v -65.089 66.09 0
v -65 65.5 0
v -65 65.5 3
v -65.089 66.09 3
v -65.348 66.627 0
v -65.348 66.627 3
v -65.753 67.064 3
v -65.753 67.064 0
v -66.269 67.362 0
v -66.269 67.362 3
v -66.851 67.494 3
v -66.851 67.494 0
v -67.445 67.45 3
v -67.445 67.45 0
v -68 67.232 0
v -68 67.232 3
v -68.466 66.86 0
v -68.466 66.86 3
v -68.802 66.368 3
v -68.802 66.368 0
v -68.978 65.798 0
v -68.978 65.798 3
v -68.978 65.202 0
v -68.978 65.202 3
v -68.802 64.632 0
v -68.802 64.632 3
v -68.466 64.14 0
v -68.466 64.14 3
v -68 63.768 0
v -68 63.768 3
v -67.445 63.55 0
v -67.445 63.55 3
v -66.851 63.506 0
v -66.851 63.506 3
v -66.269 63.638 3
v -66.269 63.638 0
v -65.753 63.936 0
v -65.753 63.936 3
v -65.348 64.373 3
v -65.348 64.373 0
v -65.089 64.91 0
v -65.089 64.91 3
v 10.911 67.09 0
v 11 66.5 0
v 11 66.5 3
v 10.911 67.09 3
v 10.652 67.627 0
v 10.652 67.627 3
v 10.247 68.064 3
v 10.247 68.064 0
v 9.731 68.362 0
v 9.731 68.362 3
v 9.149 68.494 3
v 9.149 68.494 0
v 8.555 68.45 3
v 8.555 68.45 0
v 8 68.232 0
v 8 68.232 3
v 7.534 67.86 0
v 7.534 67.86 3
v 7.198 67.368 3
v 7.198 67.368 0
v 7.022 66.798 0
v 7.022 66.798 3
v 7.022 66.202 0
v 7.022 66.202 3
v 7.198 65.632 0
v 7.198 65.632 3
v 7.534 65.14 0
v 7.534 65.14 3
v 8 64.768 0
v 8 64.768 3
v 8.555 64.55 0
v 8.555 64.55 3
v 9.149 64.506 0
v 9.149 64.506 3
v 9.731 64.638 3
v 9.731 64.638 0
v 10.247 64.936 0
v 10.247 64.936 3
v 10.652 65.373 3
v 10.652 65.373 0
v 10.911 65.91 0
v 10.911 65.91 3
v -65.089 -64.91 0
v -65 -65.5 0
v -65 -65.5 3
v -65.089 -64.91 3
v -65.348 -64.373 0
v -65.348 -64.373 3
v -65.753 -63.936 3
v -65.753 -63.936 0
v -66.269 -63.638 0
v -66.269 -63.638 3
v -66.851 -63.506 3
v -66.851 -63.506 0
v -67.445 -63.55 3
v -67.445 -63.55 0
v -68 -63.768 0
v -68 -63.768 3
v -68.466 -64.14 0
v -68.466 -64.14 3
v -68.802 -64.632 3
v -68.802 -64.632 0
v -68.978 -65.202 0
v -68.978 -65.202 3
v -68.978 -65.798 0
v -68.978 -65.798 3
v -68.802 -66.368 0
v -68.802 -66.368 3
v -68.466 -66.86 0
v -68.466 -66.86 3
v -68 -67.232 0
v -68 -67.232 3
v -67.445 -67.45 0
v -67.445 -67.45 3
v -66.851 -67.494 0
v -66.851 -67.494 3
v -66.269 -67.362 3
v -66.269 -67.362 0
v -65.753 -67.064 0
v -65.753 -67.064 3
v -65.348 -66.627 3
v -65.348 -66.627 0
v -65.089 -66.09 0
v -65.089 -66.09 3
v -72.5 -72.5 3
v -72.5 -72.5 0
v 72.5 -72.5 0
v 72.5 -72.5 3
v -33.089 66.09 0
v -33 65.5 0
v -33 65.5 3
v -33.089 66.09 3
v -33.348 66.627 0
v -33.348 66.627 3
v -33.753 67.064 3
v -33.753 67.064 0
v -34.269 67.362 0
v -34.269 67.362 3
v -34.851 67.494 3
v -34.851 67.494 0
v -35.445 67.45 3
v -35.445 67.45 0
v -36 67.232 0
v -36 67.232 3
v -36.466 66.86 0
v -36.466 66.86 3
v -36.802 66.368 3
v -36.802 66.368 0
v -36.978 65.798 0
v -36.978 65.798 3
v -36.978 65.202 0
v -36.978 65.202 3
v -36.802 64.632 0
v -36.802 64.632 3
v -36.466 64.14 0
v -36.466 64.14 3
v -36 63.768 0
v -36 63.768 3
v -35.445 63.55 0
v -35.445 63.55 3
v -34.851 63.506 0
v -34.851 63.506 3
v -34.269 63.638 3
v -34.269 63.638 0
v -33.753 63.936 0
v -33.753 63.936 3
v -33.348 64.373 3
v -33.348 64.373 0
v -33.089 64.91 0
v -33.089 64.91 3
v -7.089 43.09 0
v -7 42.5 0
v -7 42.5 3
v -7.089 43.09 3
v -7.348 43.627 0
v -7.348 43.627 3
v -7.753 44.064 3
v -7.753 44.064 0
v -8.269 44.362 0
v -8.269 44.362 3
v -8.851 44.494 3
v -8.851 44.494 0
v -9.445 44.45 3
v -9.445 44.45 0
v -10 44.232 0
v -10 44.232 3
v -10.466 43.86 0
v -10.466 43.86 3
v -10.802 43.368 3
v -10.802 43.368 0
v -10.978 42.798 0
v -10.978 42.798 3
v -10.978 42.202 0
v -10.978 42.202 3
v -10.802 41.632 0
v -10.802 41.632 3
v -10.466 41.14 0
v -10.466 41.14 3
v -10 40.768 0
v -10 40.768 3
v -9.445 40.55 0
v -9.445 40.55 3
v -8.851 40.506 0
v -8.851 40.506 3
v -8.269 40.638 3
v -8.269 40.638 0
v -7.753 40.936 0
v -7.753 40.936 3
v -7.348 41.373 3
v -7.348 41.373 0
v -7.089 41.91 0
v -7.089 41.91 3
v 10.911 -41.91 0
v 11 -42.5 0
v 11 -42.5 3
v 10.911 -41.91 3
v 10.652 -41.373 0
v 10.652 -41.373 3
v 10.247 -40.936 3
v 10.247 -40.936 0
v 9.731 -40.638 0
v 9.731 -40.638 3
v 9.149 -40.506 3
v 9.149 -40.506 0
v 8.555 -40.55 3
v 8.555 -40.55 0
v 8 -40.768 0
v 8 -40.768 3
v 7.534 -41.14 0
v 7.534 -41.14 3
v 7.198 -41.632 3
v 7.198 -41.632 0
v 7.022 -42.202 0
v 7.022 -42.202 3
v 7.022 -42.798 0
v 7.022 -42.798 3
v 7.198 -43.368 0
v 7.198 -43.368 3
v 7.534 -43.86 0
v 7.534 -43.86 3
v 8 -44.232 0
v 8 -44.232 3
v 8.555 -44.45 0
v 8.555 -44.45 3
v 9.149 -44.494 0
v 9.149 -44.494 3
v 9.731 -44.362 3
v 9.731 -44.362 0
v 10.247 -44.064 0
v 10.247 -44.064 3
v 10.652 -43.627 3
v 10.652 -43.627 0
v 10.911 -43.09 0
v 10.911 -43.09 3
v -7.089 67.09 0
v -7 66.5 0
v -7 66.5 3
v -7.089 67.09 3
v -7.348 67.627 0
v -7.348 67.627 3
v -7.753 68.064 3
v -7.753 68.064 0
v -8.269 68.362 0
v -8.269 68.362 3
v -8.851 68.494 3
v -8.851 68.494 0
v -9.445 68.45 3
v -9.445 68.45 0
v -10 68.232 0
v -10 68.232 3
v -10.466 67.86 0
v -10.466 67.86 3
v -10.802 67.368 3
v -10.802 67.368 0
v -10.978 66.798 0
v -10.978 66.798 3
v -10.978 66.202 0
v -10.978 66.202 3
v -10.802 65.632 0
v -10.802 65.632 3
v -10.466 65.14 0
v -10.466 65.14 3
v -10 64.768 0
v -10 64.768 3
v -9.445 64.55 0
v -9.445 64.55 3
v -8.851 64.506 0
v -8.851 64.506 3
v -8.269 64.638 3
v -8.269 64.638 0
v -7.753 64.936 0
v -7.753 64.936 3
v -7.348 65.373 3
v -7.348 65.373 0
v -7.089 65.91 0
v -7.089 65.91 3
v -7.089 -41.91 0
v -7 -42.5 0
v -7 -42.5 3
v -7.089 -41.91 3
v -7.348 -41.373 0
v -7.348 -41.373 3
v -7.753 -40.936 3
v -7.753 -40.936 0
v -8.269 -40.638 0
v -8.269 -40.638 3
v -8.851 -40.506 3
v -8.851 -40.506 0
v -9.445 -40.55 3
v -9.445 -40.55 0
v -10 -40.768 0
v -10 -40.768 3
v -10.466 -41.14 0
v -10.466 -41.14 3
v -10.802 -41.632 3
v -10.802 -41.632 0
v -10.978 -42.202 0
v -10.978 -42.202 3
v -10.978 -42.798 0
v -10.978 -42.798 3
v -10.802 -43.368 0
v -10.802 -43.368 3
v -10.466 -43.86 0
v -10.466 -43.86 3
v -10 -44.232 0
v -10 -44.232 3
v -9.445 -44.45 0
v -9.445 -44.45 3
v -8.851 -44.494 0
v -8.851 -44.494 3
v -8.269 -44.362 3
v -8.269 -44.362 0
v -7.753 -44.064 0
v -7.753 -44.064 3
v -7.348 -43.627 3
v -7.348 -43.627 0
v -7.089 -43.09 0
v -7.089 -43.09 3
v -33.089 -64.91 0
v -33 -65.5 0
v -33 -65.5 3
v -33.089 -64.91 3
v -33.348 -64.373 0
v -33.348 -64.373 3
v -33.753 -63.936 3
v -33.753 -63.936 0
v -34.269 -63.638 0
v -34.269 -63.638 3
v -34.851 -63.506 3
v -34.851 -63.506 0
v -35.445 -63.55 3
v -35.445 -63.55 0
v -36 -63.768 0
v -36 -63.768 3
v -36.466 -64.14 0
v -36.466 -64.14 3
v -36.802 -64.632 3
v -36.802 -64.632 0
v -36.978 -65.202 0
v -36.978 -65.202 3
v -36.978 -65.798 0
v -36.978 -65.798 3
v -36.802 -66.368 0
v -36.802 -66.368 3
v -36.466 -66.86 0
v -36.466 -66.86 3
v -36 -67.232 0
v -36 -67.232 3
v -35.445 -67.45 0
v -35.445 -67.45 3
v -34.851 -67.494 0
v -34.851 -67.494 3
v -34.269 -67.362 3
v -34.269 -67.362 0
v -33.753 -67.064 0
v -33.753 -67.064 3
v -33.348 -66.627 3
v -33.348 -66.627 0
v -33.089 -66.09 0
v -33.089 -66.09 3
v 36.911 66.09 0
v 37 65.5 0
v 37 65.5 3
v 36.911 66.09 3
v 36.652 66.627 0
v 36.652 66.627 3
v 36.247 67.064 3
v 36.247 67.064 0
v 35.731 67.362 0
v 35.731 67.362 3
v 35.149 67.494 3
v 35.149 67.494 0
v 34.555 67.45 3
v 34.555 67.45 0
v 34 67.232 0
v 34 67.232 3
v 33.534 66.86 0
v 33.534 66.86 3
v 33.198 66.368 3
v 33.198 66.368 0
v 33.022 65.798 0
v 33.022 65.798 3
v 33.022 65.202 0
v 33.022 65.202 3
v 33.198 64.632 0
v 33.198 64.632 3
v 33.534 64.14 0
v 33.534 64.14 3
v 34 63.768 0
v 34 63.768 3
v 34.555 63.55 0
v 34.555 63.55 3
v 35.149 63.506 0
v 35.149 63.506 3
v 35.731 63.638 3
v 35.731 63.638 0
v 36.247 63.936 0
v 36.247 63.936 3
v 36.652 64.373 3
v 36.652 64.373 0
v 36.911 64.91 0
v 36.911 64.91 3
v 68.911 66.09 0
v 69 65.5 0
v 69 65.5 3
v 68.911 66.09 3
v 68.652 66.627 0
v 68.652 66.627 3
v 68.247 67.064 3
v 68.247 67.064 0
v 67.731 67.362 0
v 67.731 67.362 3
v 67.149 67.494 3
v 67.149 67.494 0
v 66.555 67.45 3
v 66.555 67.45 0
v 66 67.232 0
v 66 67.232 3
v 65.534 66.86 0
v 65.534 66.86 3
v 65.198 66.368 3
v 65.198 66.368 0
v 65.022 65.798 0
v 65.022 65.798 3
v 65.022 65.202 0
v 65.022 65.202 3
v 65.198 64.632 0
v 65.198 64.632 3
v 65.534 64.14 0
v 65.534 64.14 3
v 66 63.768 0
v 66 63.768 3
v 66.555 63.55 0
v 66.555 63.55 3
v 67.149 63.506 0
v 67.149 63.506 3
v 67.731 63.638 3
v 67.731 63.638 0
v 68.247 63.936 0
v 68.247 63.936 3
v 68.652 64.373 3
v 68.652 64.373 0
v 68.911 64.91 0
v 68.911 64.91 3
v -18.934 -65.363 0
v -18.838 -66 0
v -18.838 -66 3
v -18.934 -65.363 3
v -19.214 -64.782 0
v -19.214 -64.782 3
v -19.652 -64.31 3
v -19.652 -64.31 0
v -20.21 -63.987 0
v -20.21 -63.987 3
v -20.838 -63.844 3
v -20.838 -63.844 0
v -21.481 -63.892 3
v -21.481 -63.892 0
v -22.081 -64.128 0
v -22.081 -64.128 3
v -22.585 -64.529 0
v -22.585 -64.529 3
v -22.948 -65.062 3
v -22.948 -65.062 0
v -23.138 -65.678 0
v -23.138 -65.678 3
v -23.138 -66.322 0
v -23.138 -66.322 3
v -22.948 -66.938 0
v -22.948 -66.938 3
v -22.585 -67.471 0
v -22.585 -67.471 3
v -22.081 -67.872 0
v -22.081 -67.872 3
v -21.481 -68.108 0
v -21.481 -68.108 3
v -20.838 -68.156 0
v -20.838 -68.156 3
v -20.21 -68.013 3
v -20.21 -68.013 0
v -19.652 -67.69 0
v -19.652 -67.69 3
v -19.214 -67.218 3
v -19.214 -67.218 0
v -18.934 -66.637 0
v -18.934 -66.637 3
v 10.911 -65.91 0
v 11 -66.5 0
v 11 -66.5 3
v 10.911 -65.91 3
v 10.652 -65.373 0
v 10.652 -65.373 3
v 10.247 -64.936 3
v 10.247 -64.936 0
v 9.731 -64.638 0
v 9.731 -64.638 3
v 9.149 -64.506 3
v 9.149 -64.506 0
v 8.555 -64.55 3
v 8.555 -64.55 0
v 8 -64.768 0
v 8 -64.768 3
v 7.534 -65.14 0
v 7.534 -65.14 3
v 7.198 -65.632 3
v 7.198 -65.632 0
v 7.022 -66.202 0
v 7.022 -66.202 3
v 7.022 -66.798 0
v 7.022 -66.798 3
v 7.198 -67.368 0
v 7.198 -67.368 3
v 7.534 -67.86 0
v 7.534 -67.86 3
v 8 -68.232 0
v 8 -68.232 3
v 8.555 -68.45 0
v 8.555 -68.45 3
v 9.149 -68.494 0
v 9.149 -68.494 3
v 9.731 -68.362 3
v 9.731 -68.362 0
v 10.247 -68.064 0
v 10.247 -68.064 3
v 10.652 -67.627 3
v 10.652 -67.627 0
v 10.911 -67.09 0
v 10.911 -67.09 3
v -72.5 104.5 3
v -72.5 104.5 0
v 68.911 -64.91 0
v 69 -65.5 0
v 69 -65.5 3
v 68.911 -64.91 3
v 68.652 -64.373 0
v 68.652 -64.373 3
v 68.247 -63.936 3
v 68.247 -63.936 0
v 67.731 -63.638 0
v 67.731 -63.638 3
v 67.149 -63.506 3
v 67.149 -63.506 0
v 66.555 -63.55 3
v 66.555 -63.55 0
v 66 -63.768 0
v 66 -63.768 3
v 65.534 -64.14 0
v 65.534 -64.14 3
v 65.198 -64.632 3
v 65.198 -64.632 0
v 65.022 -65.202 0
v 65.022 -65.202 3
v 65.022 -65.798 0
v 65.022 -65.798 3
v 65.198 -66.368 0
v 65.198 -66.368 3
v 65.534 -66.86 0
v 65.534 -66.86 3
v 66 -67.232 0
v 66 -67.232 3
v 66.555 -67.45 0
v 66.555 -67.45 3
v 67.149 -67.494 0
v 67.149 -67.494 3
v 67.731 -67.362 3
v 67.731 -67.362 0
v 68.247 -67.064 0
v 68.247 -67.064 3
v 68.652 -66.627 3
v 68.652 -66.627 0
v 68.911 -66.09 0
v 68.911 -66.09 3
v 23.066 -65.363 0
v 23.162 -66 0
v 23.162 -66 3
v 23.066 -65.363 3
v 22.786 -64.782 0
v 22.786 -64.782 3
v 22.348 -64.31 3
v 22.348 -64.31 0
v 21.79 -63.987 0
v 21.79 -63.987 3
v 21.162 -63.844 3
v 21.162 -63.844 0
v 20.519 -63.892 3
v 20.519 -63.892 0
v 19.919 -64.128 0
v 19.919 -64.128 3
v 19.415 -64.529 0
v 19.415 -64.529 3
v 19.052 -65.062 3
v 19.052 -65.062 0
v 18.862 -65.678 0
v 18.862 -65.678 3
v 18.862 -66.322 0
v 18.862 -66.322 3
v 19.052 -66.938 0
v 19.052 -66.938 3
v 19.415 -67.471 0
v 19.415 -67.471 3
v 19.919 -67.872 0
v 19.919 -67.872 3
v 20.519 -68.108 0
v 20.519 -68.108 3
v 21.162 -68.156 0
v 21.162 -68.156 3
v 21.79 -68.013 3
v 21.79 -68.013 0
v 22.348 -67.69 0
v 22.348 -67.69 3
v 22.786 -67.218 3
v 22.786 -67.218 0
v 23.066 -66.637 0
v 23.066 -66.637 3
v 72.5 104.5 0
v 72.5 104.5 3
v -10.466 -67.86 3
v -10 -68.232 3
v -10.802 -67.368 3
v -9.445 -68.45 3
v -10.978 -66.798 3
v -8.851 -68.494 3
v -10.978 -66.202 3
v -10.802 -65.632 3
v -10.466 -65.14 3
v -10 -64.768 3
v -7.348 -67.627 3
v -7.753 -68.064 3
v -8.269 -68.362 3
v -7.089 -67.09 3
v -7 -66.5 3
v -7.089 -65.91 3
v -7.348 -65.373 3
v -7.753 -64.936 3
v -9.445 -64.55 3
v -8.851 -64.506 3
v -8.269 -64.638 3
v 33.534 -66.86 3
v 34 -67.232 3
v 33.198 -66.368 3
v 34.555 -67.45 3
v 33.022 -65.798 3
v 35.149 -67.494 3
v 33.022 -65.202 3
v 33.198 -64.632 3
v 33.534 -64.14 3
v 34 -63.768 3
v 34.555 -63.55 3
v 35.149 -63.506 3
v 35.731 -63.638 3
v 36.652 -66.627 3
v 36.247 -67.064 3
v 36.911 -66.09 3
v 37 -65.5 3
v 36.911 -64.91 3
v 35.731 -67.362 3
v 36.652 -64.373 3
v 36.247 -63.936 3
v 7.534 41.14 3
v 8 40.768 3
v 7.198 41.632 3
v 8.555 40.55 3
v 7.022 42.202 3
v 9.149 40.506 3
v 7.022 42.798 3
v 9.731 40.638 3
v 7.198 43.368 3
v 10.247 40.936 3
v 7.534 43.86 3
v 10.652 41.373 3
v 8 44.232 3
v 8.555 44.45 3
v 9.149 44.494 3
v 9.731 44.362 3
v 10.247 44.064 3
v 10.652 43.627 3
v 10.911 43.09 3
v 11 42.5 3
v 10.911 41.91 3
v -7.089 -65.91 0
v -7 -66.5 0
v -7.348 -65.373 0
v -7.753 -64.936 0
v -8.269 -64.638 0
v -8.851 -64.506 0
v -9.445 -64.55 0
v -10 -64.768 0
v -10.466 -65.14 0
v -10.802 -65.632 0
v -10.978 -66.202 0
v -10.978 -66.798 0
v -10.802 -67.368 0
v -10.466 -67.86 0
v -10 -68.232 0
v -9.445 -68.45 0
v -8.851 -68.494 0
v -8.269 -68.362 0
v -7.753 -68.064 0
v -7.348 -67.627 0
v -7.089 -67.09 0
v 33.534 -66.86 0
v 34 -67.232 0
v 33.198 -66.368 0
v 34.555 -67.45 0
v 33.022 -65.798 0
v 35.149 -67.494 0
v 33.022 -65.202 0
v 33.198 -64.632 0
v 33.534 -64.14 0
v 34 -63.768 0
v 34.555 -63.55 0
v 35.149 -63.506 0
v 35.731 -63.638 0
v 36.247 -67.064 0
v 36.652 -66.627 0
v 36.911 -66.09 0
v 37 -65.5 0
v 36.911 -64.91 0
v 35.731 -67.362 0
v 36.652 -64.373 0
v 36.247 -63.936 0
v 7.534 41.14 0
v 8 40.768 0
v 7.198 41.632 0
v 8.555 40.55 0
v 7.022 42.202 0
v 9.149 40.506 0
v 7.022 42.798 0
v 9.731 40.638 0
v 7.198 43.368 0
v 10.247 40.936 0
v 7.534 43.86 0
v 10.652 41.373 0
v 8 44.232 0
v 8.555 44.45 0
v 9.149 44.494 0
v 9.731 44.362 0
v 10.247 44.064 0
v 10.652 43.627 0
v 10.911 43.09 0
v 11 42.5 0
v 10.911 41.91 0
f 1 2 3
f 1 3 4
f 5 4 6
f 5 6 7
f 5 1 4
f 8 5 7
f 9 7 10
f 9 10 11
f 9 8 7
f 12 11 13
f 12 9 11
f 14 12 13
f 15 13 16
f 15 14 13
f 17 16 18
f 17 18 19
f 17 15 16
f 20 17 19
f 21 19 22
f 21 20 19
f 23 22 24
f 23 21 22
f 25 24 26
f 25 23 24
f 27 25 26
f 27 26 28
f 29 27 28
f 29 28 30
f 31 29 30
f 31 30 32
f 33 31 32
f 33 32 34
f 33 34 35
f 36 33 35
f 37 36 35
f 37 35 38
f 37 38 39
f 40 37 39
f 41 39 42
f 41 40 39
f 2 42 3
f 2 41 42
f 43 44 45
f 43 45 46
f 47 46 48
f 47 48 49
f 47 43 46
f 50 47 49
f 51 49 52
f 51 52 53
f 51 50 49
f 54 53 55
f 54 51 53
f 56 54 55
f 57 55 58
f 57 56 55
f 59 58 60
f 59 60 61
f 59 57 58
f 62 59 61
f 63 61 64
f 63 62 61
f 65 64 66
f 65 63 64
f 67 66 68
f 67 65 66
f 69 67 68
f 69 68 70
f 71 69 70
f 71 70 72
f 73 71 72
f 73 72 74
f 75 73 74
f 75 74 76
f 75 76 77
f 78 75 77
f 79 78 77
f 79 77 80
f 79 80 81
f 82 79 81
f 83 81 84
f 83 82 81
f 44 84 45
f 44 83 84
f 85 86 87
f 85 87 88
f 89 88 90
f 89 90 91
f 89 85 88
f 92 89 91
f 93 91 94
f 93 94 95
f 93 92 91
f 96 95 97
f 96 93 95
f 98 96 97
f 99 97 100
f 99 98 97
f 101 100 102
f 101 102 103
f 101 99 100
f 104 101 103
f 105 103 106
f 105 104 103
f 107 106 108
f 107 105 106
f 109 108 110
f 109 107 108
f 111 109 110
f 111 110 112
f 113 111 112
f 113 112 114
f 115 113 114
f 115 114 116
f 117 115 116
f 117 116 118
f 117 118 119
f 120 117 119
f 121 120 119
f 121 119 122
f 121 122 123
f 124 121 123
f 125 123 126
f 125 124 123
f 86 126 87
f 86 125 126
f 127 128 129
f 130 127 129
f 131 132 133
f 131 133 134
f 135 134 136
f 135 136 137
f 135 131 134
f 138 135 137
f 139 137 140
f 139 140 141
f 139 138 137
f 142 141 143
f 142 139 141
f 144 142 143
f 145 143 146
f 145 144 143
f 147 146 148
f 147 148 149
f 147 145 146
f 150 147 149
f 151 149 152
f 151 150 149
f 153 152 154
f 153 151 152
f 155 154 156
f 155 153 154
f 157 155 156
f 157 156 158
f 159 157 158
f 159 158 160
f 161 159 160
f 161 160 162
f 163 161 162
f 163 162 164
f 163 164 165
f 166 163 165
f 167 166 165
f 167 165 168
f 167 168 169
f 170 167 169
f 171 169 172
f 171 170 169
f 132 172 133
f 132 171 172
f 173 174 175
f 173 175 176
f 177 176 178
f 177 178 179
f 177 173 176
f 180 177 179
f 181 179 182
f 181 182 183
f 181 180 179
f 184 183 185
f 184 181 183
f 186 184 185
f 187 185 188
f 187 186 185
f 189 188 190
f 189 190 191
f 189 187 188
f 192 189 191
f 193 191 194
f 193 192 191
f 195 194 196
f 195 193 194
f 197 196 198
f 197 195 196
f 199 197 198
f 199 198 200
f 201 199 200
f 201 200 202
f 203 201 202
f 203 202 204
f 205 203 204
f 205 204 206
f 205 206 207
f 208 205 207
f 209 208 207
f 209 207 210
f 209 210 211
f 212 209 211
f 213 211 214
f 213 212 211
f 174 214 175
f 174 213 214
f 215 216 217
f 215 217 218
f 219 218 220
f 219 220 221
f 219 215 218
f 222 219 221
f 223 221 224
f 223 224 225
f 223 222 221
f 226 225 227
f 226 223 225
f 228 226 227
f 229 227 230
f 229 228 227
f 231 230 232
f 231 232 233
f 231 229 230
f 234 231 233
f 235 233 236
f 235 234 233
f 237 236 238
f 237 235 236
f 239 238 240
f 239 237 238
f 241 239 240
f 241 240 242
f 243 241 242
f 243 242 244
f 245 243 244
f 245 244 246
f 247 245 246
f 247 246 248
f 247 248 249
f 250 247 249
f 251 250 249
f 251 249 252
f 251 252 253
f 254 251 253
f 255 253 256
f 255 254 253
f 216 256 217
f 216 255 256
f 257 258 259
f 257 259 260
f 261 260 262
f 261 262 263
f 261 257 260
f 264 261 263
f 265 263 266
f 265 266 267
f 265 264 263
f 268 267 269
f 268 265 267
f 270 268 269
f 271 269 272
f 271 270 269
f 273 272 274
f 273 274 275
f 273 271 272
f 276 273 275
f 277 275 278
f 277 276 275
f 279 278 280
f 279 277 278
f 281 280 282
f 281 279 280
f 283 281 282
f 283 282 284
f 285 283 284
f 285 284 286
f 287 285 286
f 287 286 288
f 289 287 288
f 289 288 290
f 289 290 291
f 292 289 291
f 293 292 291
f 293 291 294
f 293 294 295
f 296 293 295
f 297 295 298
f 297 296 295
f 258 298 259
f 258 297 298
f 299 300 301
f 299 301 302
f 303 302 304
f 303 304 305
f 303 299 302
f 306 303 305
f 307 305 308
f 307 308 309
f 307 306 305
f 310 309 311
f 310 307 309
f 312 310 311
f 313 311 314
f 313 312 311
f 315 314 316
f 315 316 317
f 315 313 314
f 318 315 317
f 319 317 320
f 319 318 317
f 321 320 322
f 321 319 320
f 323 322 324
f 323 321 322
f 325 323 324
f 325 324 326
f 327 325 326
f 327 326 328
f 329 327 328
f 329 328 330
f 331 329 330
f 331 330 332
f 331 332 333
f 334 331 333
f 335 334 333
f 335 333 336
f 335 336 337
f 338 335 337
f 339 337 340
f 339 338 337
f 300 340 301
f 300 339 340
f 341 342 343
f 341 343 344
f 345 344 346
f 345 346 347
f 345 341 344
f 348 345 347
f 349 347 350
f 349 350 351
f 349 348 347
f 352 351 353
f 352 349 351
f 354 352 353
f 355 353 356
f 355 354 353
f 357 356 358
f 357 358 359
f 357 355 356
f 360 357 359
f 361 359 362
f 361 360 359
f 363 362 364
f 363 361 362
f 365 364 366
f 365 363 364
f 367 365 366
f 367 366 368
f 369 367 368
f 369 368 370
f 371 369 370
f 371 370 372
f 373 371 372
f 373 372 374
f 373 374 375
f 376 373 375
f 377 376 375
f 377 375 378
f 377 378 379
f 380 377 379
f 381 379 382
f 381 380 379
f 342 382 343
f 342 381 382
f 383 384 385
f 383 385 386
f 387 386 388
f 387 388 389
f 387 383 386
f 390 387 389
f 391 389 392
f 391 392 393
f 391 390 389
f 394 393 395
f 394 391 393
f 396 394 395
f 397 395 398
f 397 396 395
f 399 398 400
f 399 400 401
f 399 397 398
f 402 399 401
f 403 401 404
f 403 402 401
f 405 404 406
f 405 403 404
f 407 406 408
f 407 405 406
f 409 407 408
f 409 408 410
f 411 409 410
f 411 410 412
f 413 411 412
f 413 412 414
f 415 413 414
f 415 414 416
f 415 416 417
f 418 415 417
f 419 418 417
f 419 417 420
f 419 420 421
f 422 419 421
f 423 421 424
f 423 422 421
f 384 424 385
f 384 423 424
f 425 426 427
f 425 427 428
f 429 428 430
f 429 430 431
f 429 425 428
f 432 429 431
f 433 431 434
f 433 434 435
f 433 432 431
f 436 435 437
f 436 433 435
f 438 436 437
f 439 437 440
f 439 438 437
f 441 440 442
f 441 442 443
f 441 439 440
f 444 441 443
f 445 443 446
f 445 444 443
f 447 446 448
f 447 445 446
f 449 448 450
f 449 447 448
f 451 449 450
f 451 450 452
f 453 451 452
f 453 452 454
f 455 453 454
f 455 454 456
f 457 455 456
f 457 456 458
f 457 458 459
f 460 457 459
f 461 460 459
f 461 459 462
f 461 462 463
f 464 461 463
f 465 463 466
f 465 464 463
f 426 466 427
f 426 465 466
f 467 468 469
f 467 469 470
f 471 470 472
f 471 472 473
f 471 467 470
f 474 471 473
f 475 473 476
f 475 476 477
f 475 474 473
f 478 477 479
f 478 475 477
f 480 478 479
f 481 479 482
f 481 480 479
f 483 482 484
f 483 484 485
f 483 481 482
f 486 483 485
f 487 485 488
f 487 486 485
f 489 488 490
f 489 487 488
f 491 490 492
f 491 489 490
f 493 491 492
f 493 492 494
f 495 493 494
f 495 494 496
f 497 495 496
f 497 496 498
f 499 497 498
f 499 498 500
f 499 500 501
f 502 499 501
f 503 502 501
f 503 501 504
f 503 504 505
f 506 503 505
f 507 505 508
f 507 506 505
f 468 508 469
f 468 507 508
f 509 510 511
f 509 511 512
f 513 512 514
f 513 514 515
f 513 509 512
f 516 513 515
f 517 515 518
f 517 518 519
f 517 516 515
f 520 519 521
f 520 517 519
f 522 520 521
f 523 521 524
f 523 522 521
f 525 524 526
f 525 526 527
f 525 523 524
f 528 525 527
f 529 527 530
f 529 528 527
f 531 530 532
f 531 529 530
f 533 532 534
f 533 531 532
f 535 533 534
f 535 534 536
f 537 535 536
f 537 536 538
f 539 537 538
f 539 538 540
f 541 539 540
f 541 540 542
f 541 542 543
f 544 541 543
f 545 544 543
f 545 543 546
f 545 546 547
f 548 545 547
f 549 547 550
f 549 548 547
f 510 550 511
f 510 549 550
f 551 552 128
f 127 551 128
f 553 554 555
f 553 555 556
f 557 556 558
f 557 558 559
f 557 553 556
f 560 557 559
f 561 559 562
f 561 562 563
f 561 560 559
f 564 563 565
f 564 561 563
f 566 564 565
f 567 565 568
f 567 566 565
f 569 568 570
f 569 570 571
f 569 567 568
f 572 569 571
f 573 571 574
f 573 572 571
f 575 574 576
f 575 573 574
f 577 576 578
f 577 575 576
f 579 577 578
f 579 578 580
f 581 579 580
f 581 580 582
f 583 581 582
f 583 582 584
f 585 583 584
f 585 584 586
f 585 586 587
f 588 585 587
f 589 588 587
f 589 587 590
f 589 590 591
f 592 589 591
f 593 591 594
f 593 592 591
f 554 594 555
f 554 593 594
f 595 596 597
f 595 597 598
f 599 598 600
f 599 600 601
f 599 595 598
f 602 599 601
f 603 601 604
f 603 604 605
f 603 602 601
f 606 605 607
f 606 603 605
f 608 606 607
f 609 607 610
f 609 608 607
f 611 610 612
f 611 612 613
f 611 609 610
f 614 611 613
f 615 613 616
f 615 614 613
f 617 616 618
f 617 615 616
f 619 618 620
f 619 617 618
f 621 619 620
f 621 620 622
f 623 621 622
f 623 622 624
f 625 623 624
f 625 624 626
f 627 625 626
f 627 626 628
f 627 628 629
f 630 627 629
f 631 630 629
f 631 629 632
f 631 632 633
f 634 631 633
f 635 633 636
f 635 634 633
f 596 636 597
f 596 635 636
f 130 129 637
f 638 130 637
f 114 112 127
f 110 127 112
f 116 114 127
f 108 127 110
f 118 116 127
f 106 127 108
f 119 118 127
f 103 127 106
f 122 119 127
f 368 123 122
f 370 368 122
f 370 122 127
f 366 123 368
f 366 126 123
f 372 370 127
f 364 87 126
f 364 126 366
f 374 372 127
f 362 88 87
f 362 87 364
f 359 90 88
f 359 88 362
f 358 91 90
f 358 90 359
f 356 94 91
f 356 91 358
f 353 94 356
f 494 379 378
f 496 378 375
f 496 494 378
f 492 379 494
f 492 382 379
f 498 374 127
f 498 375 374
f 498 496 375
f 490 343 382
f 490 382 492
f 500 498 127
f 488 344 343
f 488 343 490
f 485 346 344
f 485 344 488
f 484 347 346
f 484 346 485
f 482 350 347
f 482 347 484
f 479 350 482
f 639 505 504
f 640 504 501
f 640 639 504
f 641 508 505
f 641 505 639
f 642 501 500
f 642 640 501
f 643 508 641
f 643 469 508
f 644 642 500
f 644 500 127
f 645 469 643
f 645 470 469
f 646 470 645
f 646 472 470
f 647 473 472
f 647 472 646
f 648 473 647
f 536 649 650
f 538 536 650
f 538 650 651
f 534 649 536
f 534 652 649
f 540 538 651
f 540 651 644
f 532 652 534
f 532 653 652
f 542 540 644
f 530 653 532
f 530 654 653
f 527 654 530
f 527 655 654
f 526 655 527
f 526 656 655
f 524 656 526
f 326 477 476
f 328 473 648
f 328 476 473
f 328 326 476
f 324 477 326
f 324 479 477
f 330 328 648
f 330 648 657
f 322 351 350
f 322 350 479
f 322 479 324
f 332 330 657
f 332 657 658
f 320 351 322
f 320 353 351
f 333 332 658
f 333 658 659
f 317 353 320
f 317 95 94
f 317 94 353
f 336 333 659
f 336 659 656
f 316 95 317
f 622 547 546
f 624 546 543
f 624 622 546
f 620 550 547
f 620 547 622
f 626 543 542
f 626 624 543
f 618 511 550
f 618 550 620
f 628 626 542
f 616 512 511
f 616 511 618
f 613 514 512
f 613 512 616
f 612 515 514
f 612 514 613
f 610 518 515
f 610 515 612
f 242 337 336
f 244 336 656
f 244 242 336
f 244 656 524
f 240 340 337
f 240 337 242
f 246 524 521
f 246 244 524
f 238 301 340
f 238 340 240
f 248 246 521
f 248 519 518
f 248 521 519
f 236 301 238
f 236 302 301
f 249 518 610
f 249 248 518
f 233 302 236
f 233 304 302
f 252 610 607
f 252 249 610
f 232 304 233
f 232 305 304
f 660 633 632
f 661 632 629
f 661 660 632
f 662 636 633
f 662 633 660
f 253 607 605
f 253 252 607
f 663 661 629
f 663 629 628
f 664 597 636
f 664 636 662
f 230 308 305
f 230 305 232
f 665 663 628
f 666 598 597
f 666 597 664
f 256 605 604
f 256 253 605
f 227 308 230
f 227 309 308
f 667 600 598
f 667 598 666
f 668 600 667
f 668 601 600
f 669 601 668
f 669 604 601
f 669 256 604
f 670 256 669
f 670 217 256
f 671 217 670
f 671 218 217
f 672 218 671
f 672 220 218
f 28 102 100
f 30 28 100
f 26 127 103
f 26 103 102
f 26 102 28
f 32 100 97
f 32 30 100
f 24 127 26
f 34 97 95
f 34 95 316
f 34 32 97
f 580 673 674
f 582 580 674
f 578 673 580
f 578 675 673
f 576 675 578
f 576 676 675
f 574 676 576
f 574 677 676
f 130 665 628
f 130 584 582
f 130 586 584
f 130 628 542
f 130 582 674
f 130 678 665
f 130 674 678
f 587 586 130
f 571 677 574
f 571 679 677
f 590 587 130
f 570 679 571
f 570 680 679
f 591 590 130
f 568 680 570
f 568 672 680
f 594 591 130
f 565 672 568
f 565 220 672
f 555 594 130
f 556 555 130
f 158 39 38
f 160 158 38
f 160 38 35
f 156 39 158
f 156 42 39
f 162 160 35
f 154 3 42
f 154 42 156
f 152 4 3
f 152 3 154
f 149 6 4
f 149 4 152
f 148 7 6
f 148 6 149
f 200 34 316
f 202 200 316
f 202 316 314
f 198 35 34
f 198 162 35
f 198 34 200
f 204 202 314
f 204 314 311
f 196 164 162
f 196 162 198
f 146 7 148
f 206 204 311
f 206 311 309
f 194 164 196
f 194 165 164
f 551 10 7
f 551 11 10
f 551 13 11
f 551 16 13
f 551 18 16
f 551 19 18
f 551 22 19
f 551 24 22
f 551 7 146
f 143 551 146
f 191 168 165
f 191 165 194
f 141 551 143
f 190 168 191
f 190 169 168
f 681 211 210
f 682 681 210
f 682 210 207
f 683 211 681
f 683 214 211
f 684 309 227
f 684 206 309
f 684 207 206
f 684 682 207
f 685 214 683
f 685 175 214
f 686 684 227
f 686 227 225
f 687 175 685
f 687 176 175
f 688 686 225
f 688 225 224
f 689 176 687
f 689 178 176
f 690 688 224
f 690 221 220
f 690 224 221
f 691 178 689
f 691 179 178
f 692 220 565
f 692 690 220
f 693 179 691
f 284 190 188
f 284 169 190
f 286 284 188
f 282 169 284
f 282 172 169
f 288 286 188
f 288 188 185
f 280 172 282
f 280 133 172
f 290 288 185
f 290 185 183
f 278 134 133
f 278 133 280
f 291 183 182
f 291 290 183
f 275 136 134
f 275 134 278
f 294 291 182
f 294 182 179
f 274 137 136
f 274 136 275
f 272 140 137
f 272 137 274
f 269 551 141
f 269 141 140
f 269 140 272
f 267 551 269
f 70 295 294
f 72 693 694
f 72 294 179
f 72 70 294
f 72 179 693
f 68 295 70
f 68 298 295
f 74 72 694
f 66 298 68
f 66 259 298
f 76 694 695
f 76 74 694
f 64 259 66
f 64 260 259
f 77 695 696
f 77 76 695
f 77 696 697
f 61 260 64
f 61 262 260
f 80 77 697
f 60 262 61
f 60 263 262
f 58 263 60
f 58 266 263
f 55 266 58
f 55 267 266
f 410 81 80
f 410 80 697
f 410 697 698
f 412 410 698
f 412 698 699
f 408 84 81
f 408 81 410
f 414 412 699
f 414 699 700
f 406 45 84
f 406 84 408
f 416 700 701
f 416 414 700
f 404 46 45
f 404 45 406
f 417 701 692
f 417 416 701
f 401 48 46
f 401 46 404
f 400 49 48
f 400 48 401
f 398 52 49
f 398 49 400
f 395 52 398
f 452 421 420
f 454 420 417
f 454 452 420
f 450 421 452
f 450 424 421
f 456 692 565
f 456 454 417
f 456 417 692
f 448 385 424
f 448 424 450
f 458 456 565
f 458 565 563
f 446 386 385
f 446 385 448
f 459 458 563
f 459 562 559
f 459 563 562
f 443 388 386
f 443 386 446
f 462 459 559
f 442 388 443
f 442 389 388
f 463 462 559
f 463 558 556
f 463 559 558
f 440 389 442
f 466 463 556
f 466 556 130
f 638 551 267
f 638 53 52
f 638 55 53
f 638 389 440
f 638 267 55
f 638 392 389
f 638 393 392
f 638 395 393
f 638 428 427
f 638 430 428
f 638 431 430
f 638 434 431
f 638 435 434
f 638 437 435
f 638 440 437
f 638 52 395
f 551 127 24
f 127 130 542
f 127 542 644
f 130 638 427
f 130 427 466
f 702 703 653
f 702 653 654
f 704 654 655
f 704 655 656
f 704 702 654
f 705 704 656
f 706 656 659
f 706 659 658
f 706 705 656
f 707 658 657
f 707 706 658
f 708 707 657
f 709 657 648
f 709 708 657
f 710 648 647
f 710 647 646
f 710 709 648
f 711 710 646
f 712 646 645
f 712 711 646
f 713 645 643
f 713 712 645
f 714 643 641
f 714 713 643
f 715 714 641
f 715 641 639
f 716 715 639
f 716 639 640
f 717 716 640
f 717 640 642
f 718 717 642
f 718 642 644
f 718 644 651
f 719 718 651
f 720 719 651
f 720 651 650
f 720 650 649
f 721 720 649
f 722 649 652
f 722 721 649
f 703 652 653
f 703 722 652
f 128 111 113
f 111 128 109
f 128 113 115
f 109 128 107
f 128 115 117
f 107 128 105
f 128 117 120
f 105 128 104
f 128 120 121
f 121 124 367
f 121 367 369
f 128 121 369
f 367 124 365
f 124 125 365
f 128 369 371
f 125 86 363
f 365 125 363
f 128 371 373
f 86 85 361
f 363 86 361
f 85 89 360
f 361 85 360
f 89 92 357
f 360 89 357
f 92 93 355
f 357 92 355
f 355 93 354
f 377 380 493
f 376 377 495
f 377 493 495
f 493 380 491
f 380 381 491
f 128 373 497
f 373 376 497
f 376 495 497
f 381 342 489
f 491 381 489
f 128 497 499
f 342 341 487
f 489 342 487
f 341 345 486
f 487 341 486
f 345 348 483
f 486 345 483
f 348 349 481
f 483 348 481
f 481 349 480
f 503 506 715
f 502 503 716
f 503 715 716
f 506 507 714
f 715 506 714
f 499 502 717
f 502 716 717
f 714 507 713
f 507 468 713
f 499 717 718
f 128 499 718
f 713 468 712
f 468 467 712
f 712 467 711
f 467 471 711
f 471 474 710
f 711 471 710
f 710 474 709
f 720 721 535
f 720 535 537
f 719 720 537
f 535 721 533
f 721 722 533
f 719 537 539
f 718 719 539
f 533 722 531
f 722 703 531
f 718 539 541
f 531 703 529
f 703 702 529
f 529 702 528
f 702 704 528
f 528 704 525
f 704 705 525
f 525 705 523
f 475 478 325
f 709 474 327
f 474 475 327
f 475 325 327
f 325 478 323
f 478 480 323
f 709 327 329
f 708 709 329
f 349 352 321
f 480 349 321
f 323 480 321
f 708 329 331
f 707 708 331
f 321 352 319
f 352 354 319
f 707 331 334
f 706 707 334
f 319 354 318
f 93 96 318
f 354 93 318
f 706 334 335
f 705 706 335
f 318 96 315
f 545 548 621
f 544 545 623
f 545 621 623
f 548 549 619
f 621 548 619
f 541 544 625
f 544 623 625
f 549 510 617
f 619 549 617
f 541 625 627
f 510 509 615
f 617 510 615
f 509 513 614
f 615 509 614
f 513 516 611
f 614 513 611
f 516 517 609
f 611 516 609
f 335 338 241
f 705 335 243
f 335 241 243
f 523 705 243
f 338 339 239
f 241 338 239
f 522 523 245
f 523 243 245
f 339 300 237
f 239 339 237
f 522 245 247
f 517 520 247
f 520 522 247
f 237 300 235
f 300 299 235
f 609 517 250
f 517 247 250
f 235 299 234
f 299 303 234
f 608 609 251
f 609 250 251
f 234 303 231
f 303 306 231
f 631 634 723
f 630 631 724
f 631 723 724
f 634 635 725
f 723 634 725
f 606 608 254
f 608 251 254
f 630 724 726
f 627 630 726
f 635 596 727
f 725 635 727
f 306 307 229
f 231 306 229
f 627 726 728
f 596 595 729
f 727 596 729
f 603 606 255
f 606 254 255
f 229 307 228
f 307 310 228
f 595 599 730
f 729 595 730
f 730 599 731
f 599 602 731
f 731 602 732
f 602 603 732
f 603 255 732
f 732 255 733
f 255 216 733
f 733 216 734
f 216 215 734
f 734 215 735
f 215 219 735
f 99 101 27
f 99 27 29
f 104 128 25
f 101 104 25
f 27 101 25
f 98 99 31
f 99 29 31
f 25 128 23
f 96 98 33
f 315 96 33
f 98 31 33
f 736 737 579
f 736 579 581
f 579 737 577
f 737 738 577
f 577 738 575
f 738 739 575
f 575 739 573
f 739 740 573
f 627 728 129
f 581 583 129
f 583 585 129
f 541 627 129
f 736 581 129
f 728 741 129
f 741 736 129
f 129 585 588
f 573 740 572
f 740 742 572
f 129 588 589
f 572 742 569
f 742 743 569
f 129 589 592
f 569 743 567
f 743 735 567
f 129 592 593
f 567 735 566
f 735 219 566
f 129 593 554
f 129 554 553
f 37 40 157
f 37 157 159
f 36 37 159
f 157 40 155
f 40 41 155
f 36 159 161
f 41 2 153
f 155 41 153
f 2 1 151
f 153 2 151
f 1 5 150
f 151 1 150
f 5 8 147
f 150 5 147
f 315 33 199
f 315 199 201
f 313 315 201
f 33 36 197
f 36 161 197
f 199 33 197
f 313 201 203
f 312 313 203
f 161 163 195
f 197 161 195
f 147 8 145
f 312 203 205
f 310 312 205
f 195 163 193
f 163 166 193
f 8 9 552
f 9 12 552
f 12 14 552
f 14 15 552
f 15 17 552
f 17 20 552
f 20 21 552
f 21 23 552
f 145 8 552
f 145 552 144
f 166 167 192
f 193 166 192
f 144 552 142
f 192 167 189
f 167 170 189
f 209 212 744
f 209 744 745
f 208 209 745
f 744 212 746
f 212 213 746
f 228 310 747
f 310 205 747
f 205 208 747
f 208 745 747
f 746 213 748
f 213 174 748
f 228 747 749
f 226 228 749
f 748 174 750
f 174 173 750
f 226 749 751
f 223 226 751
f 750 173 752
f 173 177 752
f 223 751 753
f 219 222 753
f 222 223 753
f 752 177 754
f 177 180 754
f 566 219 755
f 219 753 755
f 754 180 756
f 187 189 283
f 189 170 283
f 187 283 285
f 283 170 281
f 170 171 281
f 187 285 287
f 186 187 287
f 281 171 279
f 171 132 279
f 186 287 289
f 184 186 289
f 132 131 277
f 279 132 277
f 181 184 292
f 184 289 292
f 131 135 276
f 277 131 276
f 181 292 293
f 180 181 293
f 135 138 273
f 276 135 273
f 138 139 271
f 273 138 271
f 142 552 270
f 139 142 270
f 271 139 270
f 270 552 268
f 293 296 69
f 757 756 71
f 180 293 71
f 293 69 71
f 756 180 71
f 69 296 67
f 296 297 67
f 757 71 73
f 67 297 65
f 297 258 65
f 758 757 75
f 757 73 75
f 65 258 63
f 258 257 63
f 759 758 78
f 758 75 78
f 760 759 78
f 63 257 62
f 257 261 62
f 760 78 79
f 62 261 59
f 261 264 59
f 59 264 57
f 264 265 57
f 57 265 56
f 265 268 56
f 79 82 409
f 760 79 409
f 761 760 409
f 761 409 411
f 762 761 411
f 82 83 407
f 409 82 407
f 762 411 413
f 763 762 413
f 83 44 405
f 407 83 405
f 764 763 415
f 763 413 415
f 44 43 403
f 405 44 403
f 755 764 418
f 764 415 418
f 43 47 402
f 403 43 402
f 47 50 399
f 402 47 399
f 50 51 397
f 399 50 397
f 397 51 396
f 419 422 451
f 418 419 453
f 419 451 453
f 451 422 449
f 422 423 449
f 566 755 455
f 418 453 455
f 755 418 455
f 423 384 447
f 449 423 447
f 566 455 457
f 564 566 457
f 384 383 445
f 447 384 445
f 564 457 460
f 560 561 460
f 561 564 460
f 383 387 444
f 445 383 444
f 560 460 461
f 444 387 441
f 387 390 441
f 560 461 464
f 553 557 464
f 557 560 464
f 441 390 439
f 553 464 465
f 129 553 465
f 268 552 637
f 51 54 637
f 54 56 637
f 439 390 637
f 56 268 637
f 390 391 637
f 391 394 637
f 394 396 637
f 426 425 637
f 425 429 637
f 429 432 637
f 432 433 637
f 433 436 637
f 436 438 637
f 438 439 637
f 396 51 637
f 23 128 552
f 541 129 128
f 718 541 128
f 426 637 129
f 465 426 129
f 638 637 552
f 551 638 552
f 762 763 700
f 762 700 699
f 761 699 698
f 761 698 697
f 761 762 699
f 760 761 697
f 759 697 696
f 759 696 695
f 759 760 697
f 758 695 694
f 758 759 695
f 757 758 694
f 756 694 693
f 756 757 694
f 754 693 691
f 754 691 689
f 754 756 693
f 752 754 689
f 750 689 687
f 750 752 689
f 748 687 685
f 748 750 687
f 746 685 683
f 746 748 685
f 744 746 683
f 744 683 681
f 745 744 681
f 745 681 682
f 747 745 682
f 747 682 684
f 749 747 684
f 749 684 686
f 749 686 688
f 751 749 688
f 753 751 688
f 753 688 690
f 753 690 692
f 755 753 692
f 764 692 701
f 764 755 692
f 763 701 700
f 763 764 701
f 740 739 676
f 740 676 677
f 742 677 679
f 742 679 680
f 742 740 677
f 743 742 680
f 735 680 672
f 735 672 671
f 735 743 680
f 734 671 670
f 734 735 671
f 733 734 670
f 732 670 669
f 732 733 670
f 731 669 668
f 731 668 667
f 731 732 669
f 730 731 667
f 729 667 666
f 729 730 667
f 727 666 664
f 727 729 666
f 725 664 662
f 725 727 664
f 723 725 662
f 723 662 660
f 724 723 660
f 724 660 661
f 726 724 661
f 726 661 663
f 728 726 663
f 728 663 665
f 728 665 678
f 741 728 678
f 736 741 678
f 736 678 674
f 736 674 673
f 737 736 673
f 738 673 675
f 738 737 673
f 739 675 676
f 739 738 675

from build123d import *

# Parameters (mm, degrees)
SKETCH1_R           = 2
SKETCH1_R_2         = 2.162090294
BOSS_EXTRUDE1_DEPTH = 3


with BuildPart() as part:
    # Sketch1 → Boss-Extrude1 (new body)
    with BuildSketch(Plane.XY):
        Polygon((72.5, 104.5), (-72.5, 104.5), (-72.5, 72.5), (-72.5, -72.5), (72.5, -72.5), (72.5, 72.5), align=None)
        with Locations((67, 65.5)):
            Circle(SKETCH1_R, mode=Mode.SUBTRACT)
        with Locations((-35, 65.5)):
            Circle(SKETCH1_R, mode=Mode.SUBTRACT)
        with Locations((-67, 65.5)):
            Circle(SKETCH1_R, mode=Mode.SUBTRACT)
        with Locations((-67, -65.5)):
            Circle(SKETCH1_R, mode=Mode.SUBTRACT)
        with Locations((67, -65.5)):
            Circle(SKETCH1_R, mode=Mode.SUBTRACT)
        with Locations((35, -65.5)):
            Circle(SKETCH1_R, mode=Mode.SUBTRACT)
        with Locations((21, -66)):
            Circle(SKETCH1_R_2, mode=Mode.SUBTRACT)
        with Locations((-21, -66)):
            Circle(SKETCH1_R_2, mode=Mode.SUBTRACT)
        with Locations((-9, -42.5)):
            Circle(SKETCH1_R, mode=Mode.SUBTRACT)
        with Locations((9, -66.5)):
            Circle(SKETCH1_R, mode=Mode.SUBTRACT)
        with Locations((9, 66.5)):
            Circle(SKETCH1_R, mode=Mode.SUBTRACT)
        with Locations((-9, 66.5)):
            Circle(SKETCH1_R, mode=Mode.SUBTRACT)
        with Locations((-9, 42.5)):
            Circle(SKETCH1_R, mode=Mode.SUBTRACT)
        with Locations((9, 42.5)):
            Circle(SKETCH1_R, mode=Mode.SUBTRACT)
        with Locations((-9, -66.5)):
            Circle(SKETCH1_R, mode=Mode.SUBTRACT)
        with Locations((9, -42.5)):
            Circle(SKETCH1_R, mode=Mode.SUBTRACT)
        with Locations((-35, -65.5)):
            Circle(SKETCH1_R, mode=Mode.SUBTRACT)
        with Locations((35, 65.5)):
            Circle(SKETCH1_R, mode=Mode.SUBTRACT)
    extrude(amount=BOSS_EXTRUDE1_DEPTH)


solid = part.part
